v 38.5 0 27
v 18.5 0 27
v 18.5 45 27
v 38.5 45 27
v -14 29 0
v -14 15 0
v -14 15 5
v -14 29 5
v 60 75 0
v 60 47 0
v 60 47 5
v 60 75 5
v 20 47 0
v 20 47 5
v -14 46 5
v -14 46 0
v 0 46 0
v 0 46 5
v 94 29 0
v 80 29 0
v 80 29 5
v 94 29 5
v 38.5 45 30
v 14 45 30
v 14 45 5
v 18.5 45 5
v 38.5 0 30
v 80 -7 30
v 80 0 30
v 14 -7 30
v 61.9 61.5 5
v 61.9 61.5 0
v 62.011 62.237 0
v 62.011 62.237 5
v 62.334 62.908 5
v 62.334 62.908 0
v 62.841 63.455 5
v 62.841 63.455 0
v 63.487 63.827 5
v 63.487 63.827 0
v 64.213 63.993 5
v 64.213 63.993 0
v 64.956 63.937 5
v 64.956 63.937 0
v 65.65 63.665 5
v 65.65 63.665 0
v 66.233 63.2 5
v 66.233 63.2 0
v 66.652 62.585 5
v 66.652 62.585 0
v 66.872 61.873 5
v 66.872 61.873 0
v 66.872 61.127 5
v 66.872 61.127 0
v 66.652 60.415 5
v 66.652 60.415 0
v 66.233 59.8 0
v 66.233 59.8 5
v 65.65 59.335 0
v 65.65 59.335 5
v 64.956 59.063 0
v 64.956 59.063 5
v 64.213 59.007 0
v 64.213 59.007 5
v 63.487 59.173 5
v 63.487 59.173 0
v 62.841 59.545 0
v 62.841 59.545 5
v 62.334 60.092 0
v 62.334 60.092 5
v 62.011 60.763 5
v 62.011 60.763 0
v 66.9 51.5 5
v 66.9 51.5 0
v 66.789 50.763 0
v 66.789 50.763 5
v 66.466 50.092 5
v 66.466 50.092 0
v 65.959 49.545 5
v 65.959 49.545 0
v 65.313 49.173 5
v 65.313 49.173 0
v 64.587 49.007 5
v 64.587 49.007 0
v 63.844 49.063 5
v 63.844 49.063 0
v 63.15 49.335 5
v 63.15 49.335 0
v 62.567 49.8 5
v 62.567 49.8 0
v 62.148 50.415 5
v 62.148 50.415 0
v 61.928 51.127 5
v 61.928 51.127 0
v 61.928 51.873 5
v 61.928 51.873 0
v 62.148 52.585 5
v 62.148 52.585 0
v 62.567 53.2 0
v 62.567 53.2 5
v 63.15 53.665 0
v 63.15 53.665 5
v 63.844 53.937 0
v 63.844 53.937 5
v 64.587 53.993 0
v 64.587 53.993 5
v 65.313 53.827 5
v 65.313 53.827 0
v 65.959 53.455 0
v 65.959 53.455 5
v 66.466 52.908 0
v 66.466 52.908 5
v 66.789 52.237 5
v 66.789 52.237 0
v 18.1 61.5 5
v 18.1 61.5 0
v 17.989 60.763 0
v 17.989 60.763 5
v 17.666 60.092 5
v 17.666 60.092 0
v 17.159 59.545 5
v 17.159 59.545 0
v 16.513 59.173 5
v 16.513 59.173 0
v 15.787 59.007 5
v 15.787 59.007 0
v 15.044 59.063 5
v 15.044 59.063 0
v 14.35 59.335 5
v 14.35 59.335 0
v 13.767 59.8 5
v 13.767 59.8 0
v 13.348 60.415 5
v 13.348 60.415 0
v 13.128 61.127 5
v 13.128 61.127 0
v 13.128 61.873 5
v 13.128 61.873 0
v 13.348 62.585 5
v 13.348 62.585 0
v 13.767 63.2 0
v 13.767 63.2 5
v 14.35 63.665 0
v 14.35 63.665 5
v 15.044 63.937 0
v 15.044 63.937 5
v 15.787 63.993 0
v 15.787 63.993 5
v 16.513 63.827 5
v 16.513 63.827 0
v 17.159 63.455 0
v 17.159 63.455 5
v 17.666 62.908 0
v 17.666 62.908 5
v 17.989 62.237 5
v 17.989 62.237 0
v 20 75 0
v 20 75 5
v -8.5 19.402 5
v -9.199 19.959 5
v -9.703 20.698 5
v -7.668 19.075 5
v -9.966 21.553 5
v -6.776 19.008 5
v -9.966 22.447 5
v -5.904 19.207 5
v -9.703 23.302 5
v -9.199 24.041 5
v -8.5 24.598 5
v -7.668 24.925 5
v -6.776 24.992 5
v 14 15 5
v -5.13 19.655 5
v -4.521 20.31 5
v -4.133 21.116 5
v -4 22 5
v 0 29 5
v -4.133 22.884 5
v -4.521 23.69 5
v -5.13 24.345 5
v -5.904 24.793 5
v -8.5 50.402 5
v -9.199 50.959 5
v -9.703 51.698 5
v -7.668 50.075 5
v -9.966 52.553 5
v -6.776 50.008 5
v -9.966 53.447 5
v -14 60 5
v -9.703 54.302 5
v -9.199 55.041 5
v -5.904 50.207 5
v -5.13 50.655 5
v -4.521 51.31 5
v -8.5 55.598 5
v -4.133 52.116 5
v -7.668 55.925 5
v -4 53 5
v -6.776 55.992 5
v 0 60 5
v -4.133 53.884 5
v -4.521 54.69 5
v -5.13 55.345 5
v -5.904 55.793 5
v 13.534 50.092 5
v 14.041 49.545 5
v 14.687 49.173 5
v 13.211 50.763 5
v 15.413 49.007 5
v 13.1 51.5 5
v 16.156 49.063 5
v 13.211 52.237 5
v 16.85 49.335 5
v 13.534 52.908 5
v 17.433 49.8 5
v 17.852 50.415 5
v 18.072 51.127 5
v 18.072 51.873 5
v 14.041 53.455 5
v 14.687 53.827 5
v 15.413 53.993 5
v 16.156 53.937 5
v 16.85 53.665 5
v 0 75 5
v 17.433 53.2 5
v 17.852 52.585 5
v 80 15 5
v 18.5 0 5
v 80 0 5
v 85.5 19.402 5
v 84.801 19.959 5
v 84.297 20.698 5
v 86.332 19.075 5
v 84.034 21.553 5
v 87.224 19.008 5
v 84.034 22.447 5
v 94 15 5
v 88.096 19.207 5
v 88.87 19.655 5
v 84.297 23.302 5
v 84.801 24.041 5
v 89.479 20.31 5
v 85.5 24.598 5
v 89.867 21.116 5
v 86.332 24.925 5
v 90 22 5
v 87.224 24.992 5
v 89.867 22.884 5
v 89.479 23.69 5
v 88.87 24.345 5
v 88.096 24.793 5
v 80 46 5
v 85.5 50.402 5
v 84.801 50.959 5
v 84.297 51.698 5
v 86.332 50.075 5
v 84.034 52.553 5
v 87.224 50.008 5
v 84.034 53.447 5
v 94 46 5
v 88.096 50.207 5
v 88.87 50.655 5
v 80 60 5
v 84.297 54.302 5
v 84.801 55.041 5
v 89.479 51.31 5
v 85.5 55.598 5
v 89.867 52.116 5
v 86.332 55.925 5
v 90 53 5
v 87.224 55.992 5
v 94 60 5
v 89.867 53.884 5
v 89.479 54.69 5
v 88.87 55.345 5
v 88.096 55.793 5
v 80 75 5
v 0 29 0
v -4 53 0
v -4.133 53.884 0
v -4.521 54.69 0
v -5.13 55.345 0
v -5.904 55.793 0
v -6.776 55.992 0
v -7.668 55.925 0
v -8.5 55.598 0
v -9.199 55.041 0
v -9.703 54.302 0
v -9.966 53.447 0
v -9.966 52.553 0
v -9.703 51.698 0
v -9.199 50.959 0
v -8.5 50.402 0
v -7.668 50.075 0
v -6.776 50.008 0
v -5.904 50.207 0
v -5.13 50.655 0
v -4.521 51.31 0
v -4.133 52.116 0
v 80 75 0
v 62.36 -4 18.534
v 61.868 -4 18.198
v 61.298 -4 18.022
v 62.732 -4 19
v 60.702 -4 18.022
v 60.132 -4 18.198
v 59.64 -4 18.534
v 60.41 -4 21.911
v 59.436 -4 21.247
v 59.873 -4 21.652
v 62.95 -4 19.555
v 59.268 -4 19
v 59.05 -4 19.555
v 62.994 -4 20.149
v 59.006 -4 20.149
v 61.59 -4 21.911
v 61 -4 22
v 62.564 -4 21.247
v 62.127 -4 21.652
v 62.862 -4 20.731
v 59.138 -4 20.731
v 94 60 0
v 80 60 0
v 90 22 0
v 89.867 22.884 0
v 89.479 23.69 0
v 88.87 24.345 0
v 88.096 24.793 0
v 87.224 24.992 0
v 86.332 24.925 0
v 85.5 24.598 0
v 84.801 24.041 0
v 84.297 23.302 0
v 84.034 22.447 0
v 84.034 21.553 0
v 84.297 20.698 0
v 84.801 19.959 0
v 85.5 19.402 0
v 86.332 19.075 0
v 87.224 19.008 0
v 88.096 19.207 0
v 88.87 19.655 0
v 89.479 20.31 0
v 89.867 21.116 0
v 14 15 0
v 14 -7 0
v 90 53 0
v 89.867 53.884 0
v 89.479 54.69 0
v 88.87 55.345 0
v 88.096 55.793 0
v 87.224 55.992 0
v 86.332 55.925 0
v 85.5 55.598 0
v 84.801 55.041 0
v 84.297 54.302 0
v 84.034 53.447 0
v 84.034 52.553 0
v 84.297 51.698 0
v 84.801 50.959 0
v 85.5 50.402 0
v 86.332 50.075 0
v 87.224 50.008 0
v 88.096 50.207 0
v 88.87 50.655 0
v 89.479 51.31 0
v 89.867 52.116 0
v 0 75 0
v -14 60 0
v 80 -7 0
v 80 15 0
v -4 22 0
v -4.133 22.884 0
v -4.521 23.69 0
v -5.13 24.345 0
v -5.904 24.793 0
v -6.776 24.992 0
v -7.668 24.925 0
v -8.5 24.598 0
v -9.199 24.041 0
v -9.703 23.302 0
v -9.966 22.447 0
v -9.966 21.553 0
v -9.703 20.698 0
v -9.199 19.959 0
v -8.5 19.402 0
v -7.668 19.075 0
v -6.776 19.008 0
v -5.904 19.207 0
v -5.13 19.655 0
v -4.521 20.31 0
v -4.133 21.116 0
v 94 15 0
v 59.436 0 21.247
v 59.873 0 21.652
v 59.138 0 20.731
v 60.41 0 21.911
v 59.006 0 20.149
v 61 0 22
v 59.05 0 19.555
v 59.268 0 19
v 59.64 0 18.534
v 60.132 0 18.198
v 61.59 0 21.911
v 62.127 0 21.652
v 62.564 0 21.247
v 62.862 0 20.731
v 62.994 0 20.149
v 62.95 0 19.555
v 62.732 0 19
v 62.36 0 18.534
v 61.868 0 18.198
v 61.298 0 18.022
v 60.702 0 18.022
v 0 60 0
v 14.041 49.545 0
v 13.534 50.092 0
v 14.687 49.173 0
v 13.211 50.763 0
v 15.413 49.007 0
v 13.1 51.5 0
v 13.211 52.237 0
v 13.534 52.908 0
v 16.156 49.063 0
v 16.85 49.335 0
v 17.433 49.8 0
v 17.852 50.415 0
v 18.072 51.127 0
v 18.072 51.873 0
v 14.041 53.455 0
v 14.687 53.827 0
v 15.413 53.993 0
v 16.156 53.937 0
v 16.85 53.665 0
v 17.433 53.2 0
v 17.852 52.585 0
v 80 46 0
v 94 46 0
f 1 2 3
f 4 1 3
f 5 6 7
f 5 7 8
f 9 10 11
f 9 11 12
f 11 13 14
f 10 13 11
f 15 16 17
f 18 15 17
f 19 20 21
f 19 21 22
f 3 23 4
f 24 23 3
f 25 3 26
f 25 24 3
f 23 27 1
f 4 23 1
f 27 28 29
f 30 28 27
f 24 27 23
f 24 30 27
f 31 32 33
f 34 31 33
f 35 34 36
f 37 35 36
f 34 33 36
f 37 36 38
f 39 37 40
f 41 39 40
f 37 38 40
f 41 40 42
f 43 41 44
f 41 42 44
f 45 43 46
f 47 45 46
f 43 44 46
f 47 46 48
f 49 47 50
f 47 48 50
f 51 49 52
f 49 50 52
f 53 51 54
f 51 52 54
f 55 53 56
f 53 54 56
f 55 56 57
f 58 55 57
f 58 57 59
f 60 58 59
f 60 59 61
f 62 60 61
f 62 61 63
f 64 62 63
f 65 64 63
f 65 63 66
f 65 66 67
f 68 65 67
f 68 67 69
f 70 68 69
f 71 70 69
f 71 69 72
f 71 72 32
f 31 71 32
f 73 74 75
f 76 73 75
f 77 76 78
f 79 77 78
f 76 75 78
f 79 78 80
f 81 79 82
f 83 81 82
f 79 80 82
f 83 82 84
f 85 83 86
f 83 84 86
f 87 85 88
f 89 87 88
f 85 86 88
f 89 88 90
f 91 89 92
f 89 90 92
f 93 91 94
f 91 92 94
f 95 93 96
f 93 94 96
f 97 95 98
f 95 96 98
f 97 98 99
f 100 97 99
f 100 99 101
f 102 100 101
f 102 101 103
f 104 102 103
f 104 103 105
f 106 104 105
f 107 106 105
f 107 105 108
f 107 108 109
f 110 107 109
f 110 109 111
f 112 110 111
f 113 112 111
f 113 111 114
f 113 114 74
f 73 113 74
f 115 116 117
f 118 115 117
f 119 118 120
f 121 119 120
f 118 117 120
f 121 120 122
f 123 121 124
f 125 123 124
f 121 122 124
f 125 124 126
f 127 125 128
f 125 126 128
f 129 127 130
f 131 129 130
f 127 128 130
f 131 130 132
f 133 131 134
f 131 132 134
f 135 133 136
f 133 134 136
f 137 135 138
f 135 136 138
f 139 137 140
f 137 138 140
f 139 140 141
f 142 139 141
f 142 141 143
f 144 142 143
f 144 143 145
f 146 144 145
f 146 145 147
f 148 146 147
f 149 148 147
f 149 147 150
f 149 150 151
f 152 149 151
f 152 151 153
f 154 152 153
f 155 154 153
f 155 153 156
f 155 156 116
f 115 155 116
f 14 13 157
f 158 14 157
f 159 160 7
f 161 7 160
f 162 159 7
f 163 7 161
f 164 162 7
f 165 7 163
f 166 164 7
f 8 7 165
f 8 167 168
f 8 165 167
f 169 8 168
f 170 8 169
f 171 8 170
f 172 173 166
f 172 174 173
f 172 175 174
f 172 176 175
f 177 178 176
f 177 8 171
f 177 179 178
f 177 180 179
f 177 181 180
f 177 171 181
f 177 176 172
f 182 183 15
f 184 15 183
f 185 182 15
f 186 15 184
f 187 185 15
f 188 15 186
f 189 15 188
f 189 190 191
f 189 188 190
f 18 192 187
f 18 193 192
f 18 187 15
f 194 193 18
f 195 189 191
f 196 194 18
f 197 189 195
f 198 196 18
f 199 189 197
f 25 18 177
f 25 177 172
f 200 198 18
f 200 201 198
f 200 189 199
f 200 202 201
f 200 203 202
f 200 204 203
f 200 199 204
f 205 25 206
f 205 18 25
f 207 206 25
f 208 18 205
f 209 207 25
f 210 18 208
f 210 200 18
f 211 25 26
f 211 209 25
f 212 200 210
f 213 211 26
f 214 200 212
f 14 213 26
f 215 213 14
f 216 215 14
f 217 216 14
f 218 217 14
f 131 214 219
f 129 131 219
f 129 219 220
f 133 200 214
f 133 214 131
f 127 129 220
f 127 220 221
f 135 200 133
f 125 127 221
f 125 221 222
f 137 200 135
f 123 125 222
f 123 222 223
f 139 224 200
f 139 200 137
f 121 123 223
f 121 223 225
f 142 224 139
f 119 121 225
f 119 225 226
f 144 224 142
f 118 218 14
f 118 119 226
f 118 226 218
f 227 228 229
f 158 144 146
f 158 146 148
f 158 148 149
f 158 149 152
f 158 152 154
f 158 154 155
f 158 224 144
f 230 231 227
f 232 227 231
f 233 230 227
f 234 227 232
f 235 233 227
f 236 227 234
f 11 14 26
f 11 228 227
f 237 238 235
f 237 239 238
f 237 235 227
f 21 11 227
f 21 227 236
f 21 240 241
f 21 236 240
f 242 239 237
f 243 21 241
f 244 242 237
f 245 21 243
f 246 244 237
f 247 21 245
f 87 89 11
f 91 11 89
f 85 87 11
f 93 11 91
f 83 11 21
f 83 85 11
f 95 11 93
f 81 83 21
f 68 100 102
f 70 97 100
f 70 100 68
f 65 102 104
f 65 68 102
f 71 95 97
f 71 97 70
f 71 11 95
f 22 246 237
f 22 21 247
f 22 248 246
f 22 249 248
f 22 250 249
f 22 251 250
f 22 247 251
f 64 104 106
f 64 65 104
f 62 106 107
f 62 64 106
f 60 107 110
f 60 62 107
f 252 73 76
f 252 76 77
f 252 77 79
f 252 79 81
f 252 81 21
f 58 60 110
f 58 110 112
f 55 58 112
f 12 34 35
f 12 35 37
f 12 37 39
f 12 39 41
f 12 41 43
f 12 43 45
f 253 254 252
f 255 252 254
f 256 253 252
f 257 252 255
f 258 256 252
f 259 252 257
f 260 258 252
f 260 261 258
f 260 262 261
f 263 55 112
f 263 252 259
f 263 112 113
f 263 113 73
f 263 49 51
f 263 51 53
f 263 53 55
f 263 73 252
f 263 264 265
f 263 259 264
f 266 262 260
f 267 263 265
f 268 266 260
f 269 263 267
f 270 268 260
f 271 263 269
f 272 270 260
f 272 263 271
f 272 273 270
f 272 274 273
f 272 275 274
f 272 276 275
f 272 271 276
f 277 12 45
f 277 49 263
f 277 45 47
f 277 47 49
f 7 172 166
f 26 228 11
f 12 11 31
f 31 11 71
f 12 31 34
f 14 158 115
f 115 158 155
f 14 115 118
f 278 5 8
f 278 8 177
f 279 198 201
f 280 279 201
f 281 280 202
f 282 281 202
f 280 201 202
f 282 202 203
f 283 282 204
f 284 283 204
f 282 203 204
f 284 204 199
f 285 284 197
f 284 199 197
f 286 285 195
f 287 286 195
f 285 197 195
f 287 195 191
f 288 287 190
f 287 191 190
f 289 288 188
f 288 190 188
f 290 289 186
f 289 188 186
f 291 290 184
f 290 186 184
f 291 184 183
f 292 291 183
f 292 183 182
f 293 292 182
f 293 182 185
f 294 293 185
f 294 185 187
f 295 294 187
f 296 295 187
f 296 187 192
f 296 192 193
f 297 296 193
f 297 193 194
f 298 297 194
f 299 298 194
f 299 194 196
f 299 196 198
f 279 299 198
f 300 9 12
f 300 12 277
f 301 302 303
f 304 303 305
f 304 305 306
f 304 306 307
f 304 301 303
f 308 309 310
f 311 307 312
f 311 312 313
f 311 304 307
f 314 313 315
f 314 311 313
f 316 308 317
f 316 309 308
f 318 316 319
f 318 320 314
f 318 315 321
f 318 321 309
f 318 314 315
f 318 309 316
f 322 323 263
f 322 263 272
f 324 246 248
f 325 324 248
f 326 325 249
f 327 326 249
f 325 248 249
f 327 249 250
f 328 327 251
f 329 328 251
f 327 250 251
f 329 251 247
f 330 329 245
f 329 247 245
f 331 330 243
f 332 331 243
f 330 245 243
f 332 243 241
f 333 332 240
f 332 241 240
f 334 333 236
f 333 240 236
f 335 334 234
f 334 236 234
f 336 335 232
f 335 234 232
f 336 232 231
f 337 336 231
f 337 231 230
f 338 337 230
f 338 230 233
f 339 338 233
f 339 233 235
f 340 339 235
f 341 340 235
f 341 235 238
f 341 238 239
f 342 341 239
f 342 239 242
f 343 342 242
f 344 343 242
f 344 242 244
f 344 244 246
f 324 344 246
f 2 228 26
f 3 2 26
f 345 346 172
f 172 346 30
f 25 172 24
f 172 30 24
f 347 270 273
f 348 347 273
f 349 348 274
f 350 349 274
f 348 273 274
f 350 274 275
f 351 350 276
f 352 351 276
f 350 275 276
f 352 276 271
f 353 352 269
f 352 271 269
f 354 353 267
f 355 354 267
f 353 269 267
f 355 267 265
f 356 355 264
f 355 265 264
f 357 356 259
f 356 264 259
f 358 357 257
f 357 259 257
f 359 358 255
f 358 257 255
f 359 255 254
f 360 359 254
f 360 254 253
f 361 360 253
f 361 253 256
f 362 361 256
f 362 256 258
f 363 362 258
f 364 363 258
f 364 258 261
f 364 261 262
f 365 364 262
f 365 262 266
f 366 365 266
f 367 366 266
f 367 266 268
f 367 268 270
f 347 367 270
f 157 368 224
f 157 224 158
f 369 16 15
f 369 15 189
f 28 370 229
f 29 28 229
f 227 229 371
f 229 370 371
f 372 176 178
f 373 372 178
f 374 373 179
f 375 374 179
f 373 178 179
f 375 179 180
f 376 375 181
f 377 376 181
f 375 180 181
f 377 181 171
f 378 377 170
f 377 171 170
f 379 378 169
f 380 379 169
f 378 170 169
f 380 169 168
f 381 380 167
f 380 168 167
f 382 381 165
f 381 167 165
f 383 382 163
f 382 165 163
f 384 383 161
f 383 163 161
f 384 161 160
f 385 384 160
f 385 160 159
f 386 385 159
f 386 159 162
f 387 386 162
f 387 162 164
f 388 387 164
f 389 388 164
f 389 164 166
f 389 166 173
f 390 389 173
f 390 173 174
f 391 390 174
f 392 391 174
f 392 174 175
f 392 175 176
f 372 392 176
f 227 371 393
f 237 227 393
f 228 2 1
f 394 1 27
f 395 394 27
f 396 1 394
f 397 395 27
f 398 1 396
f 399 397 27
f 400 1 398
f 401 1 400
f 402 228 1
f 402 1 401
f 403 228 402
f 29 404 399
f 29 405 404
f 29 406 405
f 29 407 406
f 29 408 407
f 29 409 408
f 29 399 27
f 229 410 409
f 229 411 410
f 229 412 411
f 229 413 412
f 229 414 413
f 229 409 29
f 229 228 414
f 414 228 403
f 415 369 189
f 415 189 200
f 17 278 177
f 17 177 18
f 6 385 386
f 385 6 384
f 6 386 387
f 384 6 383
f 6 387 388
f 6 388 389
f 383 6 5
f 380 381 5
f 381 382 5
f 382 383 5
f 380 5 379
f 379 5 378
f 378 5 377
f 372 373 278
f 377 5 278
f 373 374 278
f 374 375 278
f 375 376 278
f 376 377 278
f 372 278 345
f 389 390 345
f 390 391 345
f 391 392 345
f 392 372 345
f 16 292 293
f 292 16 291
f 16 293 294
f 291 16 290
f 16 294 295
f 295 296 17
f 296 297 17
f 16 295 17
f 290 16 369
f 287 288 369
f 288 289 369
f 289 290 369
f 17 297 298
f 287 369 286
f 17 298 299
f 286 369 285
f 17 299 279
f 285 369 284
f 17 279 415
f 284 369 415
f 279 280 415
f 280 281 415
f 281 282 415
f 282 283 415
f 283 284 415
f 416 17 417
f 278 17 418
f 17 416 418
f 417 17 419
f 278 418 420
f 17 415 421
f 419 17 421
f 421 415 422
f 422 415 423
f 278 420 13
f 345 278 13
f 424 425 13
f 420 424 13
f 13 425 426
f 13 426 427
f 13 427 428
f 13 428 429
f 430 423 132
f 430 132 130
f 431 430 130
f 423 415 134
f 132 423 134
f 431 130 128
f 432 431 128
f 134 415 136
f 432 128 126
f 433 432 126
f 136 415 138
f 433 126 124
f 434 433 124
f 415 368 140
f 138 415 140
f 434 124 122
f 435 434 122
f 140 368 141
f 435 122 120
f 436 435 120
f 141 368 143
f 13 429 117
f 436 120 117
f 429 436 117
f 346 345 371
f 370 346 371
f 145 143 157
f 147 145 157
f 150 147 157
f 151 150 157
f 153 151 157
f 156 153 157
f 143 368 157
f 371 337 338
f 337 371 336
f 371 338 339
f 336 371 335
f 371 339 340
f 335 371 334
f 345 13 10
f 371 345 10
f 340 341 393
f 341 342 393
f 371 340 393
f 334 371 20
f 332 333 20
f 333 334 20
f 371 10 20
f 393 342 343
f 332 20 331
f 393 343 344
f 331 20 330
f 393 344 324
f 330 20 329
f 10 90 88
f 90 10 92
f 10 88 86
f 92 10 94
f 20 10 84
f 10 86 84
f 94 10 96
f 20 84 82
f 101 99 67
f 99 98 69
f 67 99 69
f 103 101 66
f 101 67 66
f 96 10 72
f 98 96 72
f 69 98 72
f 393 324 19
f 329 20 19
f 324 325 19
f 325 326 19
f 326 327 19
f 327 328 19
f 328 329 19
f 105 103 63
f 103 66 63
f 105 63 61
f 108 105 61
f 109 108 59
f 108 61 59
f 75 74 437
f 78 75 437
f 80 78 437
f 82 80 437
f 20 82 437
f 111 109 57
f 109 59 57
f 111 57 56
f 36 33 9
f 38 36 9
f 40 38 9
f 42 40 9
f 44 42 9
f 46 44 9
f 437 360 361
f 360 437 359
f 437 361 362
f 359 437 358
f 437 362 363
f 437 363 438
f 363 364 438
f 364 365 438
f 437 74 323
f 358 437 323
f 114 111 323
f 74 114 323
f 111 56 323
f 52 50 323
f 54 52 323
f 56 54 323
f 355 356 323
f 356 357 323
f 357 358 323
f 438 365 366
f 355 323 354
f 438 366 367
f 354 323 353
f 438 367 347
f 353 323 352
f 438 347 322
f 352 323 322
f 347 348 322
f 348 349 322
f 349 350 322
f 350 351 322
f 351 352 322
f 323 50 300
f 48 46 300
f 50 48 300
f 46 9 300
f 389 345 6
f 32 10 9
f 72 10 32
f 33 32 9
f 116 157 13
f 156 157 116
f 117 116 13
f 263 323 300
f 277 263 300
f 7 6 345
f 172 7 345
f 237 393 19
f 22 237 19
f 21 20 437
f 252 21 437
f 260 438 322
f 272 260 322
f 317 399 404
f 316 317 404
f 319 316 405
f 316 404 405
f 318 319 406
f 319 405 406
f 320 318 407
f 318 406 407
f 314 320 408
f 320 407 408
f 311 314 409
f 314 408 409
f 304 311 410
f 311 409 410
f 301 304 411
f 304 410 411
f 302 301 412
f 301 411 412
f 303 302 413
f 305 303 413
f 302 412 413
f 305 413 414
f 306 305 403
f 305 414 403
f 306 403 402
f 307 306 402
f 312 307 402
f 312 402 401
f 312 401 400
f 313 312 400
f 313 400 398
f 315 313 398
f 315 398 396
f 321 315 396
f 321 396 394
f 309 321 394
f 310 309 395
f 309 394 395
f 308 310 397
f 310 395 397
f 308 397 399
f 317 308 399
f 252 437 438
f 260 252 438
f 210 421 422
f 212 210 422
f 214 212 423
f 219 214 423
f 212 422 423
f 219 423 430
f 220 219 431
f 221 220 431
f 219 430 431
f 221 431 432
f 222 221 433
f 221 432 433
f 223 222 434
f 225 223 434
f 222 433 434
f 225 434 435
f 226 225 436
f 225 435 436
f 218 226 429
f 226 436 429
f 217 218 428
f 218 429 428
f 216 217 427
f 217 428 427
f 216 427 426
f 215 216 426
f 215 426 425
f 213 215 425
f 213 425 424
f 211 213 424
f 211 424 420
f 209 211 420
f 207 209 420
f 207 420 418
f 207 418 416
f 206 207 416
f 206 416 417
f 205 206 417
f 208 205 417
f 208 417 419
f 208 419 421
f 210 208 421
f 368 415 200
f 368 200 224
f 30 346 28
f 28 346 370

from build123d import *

# Parameters (mm, degrees)
ESQUISSE1_W             = 80
ESQUISSE1_H             = 75
ESQUISSE1_W_2           = 40
ESQUISSE1_H_2           = 19
ESQUISSE1_W_3           = 14
ESQUISSE1_H_3           = 14
BOSS_EXTRU_1_DEPTH      = 5
ENL_V_MAT_EXTRU_1_REACH = 122.358
ESQUISSE2_R             = 3
ESQUISSE3_W             = 80
ESQUISSE3_H             = 7
BOSS_EXTRU_2_DEPTH      = 30
ENL_V_MAT_EXTRU_2_REACH = 125.94
ESQUISSE4_R             = 2.5
ENL_V_MAT_EXTRU_3_REACH = 125.94
ESQUISSE5_W             = 40
ESQUISSE5_H             = 9
ESQUISSE6_R             = 2
ENL_V_MAT_EXTRU_4_DEPTH = 4
ESQUISSE7_W             = 4.5
ESQUISSE7_H             = 45
BOSS_EXTRU_3_DEPTH      = 25
ESQUISSE8_W             = 3
ESQUISSE8_H             = 45
BOSS_EXTRU_4_DEPTH      = 20
ENL_V_MAT_EXTRU_5_REACH = 124.825
ESQUISSE9_W             = 14
ESQUISSE9_H             = 15
ENL_V_MAT_EXTRU_9_REACH = 125.94
ESQUISSE11_W            = 14
ESQUISSE11_H            = 7


with BuildPart() as part:
    # Esquisse1 → Boss.-Extru.1 (new body)
    # profile 1 of 5: a face of its own
    with BuildSketch(Plane.XY):
        with Locations((40, 37.5)):
            Rectangle(ESQUISSE1_W, ESQUISSE1_H)
        with Locations((40, 56.5)):
            Rectangle(ESQUISSE1_W_2, ESQUISSE1_H_2, mode=Mode.SUBTRACT)
    # profile 2 of 5: a face of its own
    with BuildSketch(Plane.XY):
        with Locations((-7, 53)):
            Rectangle(ESQUISSE1_W_3, ESQUISSE1_H_3)
    # profile 3 of 5: a face of its own
    with BuildSketch(Plane.XY):
        with Locations((-7, 22)):
            Rectangle(ESQUISSE1_W_3, ESQUISSE1_H_3)
    # profile 4 of 5: a face of its own
    with BuildSketch(Plane.XY):
        with Locations((87, 53)):
            Rectangle(ESQUISSE1_W_3, ESQUISSE1_H_3)
    # profile 5 of 5: a face of its own
    with BuildSketch(Plane.XY):
        with Locations((87, 22)):
            Rectangle(ESQUISSE1_W_3, ESQUISSE1_H_3)
    extrude(amount=BOSS_EXTRU_1_DEPTH)

    # Esquisse2 → Enlèv. mat.-Extru.1 (cut, up to next)
    with BuildSketch(Plane.XY.offset(5), mode=Mode.PRIVATE) as enl_v_mat_extru_1_sk1:
        with Locations((-7, 53)):
            Circle(ESQUISSE2_R)
    enl_v_mat_extru_1_tool1 = extrude(enl_v_mat_extru_1_sk1.sketch, amount=-ENL_V_MAT_EXTRU_1_REACH, mode=Mode.PRIVATE) & part.part
    # Esquisse2 → Enlèv. mat.-Extru.1 (cut, up to next)
    with BuildSketch(Plane.XY.offset(5), mode=Mode.PRIVATE) as enl_v_mat_extru_1_sk2:
        with Locations((-7, 22)):
            Circle(ESQUISSE2_R)
    enl_v_mat_extru_1_tool2 = extrude(enl_v_mat_extru_1_sk2.sketch, amount=-ENL_V_MAT_EXTRU_1_REACH, mode=Mode.PRIVATE) & part.part
    # Esquisse2 → Enlèv. mat.-Extru.1 (cut, up to next)
    with BuildSketch(Plane.XY.offset(5), mode=Mode.PRIVATE) as enl_v_mat_extru_1_sk3:
        with Locations((87, 22)):
            Circle(ESQUISSE2_R)
    enl_v_mat_extru_1_tool3 = extrude(enl_v_mat_extru_1_sk3.sketch, amount=-ENL_V_MAT_EXTRU_1_REACH, mode=Mode.PRIVATE) & part.part
    # Esquisse2 → Enlèv. mat.-Extru.1 (cut, up to next)
    with BuildSketch(Plane.XY.offset(5), mode=Mode.PRIVATE) as enl_v_mat_extru_1_sk4:
        with Locations((87, 53)):
            Circle(ESQUISSE2_R)
    enl_v_mat_extru_1_tool4 = extrude(enl_v_mat_extru_1_sk4.sketch, amount=-ENL_V_MAT_EXTRU_1_REACH, mode=Mode.PRIVATE) & part.part
    add(enl_v_mat_extru_1_tool1.solids().sort_by_distance((-7, 53, 5))[0], mode=Mode.SUBTRACT)
    add(enl_v_mat_extru_1_tool2.solids().sort_by_distance((-7, 22, 5))[0], mode=Mode.SUBTRACT)
    add(enl_v_mat_extru_1_tool3.solids().sort_by_distance((87, 22, 5))[0], mode=Mode.SUBTRACT)
    add(enl_v_mat_extru_1_tool4.solids().sort_by_distance((87, 53, 5))[0], mode=Mode.SUBTRACT)

    # Esquisse3 → Boss.-Extru.2 (add)
    with BuildSketch(Plane.XY):
        with Locations((40, -3.5)):
            Rectangle(ESQUISSE3_W, ESQUISSE3_H)
    extrude(amount=BOSS_EXTRU_2_DEPTH)

    # Esquisse4 → Enlèv. mat.-Extru.2 (cut, up to next)
    with BuildSketch(Plane(origin=(0, 0, 0), x_dir=(-1, 0, 0), z_dir=(0, 0, -1)), mode=Mode.PRIVATE) as enl_v_mat_extru_2_sk1:
        with Locations((-64.4, 61.5)):
            Circle(ESQUISSE4_R)
    enl_v_mat_extru_2_tool1 = extrude(enl_v_mat_extru_2_sk1.sketch, amount=-ENL_V_MAT_EXTRU_2_REACH, mode=Mode.PRIVATE) & part.part
    # Esquisse4 → Enlèv. mat.-Extru.2 (cut, up to next)
    with BuildSketch(Plane(origin=(0, 0, 0), x_dir=(-1, 0, 0), z_dir=(0, 0, -1)), mode=Mode.PRIVATE) as enl_v_mat_extru_2_sk2:
        with Locations(Location((-15.6, 61.5, 0), (0, 0, 180))):
            Circle(ESQUISSE4_R)
    enl_v_mat_extru_2_tool2 = extrude(enl_v_mat_extru_2_sk2.sketch, amount=-ENL_V_MAT_EXTRU_2_REACH, mode=Mode.PRIVATE) & part.part
    # Esquisse4 → Enlèv. mat.-Extru.2 (cut, up to next)
    with BuildSketch(Plane(origin=(0, 0, 0), x_dir=(-1, 0, 0), z_dir=(0, 0, -1)), mode=Mode.PRIVATE) as enl_v_mat_extru_2_sk3:
        with Locations((-15.6, 51.5)):
            Circle(ESQUISSE4_R)
    enl_v_mat_extru_2_tool3 = extrude(enl_v_mat_extru_2_sk3.sketch, amount=-ENL_V_MAT_EXTRU_2_REACH, mode=Mode.PRIVATE) & part.part
    # Esquisse4 → Enlèv. mat.-Extru.2 (cut, up to next)
    with BuildSketch(Plane(origin=(0, 0, 0), x_dir=(-1, 0, 0), z_dir=(0, 0, -1)), mode=Mode.PRIVATE) as enl_v_mat_extru_2_sk4:
        with Locations(Location((-64.4, 51.5, 0), (0, 0, 180))):
            Circle(ESQUISSE4_R)
    enl_v_mat_extru_2_tool4 = extrude(enl_v_mat_extru_2_sk4.sketch, amount=-ENL_V_MAT_EXTRU_2_REACH, mode=Mode.PRIVATE) & part.part
    add(enl_v_mat_extru_2_tool1.solids().sort_by_distance((64.4, 61.5, 0))[0], mode=Mode.SUBTRACT)
    add(enl_v_mat_extru_2_tool2.solids().sort_by_distance((15.6, 61.5, 0))[0], mode=Mode.SUBTRACT)
    add(enl_v_mat_extru_2_tool3.solids().sort_by_distance((15.6, 51.5, 0))[0], mode=Mode.SUBTRACT)
    add(enl_v_mat_extru_2_tool4.solids().sort_by_distance((64.4, 51.5, 0))[0], mode=Mode.SUBTRACT)

    # Esquisse5 → Enlèv. mat.-Extru.3 (cut, up to next)
    with BuildSketch(Plane(origin=(0, 0, 0), x_dir=(-1, 0, 0), z_dir=(0, 0, -1)), mode=Mode.PRIVATE) as enl_v_mat_extru_3_sk1:
        with Locations((-40, 70.5)):
            Rectangle(ESQUISSE5_W, ESQUISSE5_H)
    enl_v_mat_extru_3_tool1 = extrude(enl_v_mat_extru_3_sk1.sketch, amount=-ENL_V_MAT_EXTRU_3_REACH, mode=Mode.PRIVATE) & part.part
    add(enl_v_mat_extru_3_tool1.solids().sort_by_distance((40, 70.5, 0))[0], mode=Mode.SUBTRACT)

    # Esquisse6 → Enlèv. mat.-Extru.4 (cut)
    with BuildSketch(Plane(origin=(0, 0, 0), x_dir=(1, 0, 0), z_dir=(0, 1, 0))):
        with Locations(Location((61, -20, 0), (0, 0, 270))):
            Circle(ESQUISSE6_R)
    extrude(amount=-ENL_V_MAT_EXTRU_4_DEPTH, mode=Mode.SUBTRACT)

    # Esquisse7 → Boss.-Extru.3 (add)
    with BuildSketch(Plane.XY.offset(5)):
        with Locations((16.25, 22.5)):
            Rectangle(ESQUISSE7_W, ESQUISSE7_H)
    extrude(amount=BOSS_EXTRU_3_DEPTH)

    # Esquisse8 → Boss.-Extru.4 (add)
    with BuildSketch(Plane(origin=(18.5, 0, 0), x_dir=(0, 0, -1), z_dir=(1, 0, 0))):
        with Locations((-28.5, 22.5)):
            Rectangle(ESQUISSE8_W, ESQUISSE8_H)
    extrude(amount=BOSS_EXTRU_4_DEPTH)

    # Esquisse9 → Enlèv. mat.-Extru.5 (cut, up to next)
    with BuildSketch(Plane.XY.offset(5), mode=Mode.PRIVATE) as enl_v_mat_extru_5_sk1:
        with Locations((7, 7.5)):
            Rectangle(ESQUISSE9_W, ESQUISSE9_H)
    enl_v_mat_extru_5_tool1 = extrude(enl_v_mat_extru_5_sk1.sketch, amount=-ENL_V_MAT_EXTRU_5_REACH, mode=Mode.PRIVATE) & part.part
    add(enl_v_mat_extru_5_tool1.solids().sort_by_distance((7, 7.5, 5))[0], mode=Mode.SUBTRACT)

    # Esquisse11 → Enlèv. mat.-Extru.9 (cut, up to next)
    with BuildSketch(Plane.XY.offset(30), mode=Mode.PRIVATE) as enl_v_mat_extru_9_sk1:
        with Locations((7, -3.5)):
            Rectangle(ESQUISSE11_W, ESQUISSE11_H)
    enl_v_mat_extru_9_tool1 = extrude(enl_v_mat_extru_9_sk1.sketch, amount=-ENL_V_MAT_EXTRU_9_REACH, mode=Mode.PRIVATE) & part.part
    add(enl_v_mat_extru_9_tool1.solids().sort_by_distance((7, -3.5, 30))[0], mode=Mode.SUBTRACT)


solid = part.part
